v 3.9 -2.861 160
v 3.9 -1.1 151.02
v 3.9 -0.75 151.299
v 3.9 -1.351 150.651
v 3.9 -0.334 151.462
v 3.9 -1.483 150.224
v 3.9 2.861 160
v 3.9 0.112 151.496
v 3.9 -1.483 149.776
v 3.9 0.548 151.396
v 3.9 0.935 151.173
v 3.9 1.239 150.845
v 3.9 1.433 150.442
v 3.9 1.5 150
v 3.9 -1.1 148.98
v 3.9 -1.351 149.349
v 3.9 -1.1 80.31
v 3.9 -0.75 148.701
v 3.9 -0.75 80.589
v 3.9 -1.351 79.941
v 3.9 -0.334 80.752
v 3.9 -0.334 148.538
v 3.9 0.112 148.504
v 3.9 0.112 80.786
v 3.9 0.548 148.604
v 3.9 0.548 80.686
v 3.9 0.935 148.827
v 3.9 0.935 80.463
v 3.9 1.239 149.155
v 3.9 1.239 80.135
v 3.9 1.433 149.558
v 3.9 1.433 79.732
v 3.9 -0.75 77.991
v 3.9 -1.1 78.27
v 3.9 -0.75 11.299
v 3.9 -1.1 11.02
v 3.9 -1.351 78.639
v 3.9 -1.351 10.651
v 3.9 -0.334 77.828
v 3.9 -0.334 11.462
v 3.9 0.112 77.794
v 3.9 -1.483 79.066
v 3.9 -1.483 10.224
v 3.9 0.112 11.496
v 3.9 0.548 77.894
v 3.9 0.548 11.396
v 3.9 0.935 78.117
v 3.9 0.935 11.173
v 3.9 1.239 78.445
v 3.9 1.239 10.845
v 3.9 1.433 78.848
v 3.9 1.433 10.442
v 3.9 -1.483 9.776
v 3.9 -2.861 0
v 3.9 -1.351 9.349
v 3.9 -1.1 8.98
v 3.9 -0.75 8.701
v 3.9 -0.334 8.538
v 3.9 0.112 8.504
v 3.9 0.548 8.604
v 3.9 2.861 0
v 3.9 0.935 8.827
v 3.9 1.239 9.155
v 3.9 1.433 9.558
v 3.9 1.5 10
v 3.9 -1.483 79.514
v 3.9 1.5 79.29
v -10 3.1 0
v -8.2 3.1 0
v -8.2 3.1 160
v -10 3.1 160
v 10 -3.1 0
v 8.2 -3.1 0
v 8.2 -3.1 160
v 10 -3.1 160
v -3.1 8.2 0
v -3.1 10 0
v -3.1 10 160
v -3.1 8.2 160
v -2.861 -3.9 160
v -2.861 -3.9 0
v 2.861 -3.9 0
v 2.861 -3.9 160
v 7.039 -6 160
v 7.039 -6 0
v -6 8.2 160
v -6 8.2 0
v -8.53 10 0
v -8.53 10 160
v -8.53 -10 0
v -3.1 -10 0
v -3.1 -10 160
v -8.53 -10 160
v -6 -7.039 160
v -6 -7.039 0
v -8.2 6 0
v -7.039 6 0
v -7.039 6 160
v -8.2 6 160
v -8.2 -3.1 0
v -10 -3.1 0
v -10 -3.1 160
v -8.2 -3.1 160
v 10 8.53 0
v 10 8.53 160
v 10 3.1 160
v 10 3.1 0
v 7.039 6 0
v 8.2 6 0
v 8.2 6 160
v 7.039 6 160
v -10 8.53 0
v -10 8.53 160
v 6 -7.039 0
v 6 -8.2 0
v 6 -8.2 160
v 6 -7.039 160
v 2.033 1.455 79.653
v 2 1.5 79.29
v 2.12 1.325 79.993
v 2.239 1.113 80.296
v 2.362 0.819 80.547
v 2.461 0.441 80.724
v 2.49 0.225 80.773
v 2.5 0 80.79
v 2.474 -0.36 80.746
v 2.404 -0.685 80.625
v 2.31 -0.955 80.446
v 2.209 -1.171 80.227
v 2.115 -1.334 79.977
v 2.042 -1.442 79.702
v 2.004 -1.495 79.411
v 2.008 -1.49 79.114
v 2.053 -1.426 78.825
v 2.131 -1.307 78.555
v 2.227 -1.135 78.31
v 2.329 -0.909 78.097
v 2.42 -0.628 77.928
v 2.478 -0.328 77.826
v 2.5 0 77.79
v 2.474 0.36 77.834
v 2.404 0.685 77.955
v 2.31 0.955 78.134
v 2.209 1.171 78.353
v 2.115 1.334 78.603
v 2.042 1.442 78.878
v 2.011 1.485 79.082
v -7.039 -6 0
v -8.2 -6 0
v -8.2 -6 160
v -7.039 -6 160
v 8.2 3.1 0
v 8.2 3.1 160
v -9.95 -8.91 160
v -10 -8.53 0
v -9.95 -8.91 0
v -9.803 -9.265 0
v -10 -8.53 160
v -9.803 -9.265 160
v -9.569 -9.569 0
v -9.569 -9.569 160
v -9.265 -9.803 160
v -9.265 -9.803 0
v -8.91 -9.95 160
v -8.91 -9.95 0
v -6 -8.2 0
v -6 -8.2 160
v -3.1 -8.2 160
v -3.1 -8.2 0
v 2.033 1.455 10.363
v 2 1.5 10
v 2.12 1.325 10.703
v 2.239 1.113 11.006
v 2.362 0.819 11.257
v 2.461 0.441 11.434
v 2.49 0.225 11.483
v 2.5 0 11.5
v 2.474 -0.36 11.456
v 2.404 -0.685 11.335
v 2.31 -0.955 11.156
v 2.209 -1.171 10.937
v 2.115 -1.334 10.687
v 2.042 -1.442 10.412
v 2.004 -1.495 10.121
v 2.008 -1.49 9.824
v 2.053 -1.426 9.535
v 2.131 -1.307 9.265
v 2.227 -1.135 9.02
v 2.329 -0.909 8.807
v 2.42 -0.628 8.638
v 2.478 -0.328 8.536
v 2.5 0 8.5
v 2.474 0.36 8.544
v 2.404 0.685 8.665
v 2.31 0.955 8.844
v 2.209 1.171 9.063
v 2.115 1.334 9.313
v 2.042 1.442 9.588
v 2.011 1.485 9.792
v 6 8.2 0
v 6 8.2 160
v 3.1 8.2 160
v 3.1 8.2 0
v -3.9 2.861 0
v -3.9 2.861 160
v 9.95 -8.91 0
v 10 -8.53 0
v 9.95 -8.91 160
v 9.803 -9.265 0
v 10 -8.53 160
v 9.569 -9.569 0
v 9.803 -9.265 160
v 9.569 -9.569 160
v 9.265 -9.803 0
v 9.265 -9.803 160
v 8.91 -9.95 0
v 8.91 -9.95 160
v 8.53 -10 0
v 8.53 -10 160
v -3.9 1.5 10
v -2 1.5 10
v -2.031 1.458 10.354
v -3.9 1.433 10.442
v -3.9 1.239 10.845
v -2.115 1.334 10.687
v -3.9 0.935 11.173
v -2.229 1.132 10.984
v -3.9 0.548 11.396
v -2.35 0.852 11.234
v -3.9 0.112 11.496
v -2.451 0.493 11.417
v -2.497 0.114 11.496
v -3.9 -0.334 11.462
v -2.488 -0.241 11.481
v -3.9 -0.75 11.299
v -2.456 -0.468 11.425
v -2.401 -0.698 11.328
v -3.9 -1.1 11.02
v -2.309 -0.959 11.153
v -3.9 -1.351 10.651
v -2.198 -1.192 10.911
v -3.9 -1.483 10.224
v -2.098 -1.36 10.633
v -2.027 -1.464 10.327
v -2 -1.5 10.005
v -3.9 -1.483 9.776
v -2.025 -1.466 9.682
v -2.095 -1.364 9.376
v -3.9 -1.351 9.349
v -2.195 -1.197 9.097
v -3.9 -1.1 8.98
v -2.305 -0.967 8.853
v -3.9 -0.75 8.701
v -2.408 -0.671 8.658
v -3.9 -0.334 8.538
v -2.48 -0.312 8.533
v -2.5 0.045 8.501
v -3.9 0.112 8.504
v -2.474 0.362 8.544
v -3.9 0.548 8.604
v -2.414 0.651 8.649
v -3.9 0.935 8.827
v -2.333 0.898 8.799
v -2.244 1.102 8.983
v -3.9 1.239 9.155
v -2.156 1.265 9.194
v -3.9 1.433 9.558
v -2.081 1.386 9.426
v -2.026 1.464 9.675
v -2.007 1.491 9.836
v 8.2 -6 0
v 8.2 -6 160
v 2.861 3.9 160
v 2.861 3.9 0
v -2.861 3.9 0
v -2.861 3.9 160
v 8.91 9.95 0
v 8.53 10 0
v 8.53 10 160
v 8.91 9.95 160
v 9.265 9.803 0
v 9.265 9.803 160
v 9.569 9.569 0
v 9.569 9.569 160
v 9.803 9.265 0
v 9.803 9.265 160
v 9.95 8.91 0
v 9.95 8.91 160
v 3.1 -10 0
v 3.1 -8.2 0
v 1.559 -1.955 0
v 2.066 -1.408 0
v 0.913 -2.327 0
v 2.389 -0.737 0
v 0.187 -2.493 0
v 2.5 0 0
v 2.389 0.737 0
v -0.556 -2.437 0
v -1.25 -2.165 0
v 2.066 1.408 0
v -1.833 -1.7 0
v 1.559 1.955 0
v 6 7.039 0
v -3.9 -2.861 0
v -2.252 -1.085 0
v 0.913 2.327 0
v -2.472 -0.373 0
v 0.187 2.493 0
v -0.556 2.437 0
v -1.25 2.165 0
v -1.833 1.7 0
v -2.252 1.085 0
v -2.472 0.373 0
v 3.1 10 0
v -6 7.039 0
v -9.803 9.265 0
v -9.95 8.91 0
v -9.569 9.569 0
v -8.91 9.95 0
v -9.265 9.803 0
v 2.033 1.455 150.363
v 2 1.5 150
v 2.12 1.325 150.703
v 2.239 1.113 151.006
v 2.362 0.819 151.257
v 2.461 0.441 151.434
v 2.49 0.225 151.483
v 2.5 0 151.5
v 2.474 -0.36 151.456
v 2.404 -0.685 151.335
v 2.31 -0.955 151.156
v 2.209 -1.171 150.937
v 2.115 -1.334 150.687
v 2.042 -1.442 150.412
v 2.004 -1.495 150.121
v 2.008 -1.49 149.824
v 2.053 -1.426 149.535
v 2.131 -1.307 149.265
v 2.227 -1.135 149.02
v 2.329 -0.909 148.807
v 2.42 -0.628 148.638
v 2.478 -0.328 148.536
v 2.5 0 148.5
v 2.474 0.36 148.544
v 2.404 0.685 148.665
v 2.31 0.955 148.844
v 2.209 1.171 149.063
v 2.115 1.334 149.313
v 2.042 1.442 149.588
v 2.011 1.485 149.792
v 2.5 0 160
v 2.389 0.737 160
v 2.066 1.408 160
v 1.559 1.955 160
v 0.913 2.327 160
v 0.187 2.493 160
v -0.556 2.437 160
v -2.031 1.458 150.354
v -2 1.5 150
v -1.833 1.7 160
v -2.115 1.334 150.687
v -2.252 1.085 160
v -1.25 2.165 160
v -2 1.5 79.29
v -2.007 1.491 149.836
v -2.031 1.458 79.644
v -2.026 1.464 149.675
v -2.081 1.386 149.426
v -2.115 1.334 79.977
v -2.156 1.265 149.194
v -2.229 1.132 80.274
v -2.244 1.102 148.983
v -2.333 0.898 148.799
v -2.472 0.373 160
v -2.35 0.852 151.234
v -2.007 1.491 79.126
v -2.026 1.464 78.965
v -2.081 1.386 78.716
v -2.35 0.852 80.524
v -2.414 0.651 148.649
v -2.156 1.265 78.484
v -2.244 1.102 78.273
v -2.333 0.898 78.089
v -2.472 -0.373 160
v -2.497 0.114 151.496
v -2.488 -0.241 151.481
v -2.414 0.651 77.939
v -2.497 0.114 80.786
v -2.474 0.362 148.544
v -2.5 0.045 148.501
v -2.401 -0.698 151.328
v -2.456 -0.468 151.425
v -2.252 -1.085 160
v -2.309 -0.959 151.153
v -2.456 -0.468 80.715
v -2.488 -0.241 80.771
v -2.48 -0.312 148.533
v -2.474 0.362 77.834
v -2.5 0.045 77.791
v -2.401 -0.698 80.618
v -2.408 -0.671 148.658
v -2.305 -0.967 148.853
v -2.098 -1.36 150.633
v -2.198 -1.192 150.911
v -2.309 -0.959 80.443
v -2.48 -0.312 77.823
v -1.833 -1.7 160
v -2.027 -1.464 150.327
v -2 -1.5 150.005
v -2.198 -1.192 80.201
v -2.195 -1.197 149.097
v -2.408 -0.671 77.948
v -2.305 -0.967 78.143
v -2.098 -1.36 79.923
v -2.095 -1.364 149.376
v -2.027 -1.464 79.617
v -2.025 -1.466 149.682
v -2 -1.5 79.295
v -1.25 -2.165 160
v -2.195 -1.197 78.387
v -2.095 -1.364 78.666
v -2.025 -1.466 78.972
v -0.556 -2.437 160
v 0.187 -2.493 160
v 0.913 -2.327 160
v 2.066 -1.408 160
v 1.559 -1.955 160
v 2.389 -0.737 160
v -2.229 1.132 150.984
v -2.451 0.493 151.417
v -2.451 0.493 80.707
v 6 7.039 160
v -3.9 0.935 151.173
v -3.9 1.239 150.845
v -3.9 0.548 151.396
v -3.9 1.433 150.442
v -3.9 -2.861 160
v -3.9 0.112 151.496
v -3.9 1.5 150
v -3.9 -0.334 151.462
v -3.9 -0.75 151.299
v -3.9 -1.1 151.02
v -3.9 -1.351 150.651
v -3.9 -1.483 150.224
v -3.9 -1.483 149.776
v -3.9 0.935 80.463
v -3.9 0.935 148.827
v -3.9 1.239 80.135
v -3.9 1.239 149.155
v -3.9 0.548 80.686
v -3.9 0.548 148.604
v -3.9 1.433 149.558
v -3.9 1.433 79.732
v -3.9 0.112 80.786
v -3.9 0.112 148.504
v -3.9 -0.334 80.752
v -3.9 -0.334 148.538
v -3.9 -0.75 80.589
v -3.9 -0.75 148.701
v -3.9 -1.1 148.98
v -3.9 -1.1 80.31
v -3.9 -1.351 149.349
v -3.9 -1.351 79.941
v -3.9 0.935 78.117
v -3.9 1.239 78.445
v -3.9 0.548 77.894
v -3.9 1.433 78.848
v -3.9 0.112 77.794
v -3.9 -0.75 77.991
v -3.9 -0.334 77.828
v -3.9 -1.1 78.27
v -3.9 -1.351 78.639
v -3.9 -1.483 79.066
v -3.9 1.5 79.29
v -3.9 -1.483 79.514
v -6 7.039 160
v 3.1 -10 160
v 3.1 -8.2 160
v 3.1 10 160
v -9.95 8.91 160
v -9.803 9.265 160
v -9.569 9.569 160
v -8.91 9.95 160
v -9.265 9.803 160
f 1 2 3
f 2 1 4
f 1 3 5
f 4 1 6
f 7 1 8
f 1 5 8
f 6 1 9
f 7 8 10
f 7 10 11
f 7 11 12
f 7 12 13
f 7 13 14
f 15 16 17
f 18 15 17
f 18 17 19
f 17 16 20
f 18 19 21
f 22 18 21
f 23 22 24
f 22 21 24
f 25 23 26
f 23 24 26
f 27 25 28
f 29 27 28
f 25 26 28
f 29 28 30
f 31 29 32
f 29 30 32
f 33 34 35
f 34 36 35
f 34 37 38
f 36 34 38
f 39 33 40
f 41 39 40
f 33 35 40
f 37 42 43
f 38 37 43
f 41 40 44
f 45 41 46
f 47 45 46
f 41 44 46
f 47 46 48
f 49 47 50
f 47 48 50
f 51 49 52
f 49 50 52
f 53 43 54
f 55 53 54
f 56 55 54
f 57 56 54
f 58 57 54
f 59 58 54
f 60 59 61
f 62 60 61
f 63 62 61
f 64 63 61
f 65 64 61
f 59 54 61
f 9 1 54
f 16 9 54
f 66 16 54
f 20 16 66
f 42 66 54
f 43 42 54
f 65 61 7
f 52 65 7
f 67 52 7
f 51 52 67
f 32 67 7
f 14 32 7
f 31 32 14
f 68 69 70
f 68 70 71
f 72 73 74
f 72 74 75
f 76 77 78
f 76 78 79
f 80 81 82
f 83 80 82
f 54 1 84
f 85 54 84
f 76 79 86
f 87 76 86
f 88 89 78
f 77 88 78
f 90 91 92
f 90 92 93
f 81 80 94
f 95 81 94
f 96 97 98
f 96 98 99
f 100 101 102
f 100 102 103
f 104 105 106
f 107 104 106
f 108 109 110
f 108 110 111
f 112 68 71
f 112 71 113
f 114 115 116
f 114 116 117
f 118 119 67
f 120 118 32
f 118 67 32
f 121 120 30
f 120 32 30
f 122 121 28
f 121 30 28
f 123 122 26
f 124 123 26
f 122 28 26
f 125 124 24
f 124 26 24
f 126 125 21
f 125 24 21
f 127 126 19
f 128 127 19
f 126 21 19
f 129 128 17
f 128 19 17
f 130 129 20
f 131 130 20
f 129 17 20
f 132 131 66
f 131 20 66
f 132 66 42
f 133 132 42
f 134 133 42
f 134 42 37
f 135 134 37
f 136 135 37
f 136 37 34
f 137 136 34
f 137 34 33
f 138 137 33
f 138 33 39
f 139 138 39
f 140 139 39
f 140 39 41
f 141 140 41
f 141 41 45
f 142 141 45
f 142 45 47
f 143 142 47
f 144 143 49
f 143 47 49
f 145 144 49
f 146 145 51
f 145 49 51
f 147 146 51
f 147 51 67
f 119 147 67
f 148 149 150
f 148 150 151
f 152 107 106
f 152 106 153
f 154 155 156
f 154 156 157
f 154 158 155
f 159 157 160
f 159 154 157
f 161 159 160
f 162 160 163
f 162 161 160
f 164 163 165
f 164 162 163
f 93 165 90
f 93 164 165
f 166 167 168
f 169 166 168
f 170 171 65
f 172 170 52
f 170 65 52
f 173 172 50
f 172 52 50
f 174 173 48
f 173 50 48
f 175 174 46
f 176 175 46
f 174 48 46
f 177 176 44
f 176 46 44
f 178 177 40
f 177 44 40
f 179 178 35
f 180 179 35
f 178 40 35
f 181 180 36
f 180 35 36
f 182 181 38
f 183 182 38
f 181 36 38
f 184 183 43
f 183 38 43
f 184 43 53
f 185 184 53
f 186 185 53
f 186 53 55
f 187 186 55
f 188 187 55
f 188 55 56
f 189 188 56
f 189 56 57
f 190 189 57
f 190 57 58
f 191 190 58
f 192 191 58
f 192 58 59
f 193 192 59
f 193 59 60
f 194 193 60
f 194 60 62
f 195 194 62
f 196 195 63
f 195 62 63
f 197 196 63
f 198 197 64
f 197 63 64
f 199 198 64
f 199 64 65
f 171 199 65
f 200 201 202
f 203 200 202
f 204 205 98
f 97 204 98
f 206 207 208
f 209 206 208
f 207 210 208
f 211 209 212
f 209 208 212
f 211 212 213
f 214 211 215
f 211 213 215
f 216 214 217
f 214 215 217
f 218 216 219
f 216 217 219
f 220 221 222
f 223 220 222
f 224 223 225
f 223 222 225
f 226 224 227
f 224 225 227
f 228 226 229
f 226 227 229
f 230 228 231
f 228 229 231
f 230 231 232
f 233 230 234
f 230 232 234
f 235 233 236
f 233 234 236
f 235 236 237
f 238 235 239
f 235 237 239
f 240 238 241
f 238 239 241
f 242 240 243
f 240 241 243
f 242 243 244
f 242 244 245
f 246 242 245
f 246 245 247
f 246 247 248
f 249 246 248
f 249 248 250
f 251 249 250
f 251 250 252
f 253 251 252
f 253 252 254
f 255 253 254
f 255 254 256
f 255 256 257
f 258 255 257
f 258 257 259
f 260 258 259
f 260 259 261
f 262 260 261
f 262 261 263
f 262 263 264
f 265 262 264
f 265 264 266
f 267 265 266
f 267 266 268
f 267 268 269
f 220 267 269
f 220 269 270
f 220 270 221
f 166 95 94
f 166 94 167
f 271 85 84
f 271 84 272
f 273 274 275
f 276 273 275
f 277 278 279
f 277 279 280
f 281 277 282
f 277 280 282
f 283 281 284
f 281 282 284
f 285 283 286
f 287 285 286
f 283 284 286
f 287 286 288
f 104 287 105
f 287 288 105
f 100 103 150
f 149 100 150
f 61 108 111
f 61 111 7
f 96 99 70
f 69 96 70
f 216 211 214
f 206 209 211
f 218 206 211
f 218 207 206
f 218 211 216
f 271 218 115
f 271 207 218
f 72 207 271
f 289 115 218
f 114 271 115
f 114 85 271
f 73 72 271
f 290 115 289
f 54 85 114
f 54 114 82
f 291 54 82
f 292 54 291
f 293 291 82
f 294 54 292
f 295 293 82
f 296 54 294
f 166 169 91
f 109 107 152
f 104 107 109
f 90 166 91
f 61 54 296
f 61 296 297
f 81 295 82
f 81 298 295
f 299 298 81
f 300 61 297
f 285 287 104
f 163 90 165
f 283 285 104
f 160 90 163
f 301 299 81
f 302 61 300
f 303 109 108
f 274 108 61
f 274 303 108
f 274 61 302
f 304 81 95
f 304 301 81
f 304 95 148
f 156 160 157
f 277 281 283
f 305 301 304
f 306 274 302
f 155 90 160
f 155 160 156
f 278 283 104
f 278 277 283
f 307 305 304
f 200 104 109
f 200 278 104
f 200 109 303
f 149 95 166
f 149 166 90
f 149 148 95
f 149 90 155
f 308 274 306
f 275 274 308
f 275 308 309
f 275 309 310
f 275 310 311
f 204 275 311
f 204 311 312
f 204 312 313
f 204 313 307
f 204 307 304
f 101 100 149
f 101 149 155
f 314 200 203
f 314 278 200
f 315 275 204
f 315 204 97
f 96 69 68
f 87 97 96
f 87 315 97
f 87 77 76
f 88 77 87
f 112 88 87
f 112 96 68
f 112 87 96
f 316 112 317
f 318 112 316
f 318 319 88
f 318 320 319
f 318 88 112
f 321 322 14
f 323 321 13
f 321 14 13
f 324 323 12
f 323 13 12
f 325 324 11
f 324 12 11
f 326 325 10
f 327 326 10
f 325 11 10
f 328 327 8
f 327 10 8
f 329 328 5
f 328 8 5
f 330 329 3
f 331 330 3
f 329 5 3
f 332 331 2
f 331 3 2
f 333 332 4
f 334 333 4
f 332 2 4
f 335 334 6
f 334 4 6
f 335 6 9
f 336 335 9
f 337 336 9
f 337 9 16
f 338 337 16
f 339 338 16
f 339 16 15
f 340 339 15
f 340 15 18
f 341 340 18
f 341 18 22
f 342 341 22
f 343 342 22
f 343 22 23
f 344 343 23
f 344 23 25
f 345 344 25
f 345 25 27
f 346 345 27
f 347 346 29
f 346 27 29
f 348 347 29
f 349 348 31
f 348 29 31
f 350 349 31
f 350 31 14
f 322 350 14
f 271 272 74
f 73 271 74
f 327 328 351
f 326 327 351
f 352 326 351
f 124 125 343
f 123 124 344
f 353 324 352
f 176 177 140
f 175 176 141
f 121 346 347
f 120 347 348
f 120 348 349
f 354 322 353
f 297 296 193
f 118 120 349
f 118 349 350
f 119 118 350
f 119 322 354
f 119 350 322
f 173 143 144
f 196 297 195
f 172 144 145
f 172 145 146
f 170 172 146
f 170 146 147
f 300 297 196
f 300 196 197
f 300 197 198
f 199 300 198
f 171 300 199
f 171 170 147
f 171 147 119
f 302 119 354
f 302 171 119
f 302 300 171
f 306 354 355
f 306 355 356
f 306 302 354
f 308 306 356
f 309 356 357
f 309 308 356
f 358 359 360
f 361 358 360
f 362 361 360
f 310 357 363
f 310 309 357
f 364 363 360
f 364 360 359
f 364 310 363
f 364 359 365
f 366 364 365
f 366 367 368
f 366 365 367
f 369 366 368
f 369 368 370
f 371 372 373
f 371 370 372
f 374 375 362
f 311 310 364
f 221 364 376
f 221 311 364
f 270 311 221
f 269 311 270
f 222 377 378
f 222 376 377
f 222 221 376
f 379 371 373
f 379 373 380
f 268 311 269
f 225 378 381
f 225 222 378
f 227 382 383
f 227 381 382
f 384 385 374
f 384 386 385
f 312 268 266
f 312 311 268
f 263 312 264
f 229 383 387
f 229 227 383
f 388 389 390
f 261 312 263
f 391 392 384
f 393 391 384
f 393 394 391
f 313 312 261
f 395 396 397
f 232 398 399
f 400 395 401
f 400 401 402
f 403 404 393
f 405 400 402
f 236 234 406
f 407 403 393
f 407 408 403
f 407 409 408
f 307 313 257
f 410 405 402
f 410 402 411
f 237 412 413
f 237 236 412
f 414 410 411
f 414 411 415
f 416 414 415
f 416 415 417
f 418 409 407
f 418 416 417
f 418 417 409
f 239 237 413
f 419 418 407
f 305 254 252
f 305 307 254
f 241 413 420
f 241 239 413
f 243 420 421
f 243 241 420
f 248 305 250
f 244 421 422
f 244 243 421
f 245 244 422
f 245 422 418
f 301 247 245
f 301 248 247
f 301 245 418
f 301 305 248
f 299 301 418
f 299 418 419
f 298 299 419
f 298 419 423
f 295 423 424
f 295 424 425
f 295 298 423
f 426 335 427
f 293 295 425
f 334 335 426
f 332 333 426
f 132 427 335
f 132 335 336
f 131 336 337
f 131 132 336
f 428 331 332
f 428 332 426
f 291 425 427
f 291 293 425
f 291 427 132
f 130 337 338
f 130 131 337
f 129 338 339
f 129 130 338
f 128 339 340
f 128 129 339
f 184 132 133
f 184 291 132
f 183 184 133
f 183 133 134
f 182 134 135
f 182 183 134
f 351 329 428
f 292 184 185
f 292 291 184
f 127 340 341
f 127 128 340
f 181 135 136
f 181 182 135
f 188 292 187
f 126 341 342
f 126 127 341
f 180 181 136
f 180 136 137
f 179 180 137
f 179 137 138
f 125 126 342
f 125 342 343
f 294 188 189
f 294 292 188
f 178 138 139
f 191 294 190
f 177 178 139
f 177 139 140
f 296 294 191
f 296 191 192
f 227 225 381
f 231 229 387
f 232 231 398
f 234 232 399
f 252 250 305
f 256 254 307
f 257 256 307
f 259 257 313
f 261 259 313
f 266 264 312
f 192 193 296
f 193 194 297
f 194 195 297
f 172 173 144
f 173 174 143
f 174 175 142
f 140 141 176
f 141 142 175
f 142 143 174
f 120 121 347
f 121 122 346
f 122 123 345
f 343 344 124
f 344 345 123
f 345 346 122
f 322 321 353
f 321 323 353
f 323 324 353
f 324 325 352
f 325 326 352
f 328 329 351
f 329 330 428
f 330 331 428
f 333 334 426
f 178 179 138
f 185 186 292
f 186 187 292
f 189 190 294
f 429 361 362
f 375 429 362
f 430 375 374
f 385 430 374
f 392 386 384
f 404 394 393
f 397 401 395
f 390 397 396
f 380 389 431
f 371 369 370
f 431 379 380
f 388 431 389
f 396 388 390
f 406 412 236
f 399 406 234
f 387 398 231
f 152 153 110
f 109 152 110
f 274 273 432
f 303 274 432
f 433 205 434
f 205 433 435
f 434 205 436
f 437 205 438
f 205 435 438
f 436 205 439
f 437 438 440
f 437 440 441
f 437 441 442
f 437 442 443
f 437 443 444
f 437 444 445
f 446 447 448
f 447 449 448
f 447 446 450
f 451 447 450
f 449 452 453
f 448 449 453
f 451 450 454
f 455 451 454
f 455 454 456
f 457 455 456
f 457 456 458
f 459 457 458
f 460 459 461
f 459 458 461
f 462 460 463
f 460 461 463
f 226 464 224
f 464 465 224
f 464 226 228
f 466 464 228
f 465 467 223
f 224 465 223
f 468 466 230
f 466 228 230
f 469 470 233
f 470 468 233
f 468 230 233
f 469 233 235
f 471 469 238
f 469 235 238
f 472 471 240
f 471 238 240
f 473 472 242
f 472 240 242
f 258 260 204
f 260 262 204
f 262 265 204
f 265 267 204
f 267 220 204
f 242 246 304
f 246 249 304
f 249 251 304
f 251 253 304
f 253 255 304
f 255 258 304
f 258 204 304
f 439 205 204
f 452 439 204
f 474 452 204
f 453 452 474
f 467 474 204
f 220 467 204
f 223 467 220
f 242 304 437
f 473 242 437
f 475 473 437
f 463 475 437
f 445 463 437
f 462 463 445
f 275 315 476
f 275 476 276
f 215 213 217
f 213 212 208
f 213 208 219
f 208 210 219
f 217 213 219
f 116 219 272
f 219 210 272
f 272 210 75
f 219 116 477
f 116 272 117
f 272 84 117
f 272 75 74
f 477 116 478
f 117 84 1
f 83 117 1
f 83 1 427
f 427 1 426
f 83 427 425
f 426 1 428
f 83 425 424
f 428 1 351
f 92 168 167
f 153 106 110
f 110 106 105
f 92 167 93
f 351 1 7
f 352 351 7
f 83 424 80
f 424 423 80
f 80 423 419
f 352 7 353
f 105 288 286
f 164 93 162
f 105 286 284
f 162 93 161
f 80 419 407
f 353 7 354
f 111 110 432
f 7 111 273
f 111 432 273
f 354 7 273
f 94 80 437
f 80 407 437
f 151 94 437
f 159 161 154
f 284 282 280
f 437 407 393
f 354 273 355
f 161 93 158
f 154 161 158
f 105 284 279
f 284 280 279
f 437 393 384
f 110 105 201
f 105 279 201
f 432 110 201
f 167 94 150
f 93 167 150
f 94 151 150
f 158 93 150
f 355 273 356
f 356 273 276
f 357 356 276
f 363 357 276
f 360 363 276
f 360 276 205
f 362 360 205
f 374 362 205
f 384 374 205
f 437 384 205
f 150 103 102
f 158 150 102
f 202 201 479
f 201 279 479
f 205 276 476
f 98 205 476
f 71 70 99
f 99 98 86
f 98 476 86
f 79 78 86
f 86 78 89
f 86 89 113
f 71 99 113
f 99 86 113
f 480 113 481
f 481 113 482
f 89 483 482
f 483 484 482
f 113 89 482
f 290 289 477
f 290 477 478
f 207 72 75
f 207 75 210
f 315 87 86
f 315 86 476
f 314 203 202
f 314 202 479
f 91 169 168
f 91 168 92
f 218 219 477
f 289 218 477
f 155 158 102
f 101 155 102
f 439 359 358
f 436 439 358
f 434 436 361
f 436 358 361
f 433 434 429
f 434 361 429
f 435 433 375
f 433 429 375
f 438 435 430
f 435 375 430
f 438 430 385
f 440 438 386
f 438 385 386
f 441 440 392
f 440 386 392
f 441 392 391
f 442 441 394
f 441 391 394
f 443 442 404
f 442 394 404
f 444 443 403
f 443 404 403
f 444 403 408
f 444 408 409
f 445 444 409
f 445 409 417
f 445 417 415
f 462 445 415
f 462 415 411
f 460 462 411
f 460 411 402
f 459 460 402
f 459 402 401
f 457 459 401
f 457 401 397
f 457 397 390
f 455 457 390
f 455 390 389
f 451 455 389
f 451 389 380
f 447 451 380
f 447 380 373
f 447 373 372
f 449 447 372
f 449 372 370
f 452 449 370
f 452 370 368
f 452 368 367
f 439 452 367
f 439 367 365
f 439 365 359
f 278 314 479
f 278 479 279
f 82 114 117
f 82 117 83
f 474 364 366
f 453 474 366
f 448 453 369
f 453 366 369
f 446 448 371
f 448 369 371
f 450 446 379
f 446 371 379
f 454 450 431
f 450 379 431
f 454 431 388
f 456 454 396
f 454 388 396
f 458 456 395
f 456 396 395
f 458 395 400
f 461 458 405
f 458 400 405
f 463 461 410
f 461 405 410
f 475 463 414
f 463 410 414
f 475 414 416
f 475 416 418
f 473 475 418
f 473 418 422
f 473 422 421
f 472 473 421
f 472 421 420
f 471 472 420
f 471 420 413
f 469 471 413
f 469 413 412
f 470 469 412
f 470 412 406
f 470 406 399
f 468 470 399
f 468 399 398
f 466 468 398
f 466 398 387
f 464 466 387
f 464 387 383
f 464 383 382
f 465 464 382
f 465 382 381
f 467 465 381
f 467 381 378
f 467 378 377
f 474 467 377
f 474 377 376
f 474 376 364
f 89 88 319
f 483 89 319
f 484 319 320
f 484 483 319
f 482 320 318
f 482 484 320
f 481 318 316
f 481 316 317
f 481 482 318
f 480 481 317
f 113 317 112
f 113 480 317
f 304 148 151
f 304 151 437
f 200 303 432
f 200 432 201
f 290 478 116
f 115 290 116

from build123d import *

# Parameters (mm, degrees)
SKETCH1_R           = 2.5
BOSS_EXTRUDE1_DEPTH = 160
FILLET1_R           = 1.47
SKETCH2_R           = 1.5
CUT_EXTRUDE1_DEPTH  = 161.913672508


with BuildPart() as part:
    # Sketch1 → Boss-Extrude1 (new body)
    with BuildSketch(Plane.XY):
        Polygon((2.860553032, 3.9), (6, 7.039446968), (6, 8.2), (3.1, 8.2), (3.1, 10), (10, 10), (10, 3.1), (8.2, 3.1), (8.2, 6), (7.039446968, 6), (3.9, 2.860553032), (3.9, 0), (3.9, -2.860553032), (7.039446968, -6), (8.2, -6), (8.2, -3.1), (10, -3.1), (10, -10), (3.1, -10), (3.1, -8.2), (6, -8.2), (6, -7.039446968), (2.860553032, -3.9), (0, -3.9), (-2.860553032, -3.9), (-6, -7.039446968), (-6, -8.2), (-3.1, -8.2), (-3.1, -10), (-10, -10), (-10, -3.1), (-8.2, -3.1), (-8.2, -6), (-7.039446968, -6), (-3.9, -2.860553032), (-3.9, 0), (-3.9, 2.860553032), (-7.039446968, 6), (-8.2, 6), (-8.2, 3.1), (-10, 3.1), (-10, 10), (-3.1, 10), (-3.1, 8.2), (-6, 8.2), (-6, 7.039446968), (-2.860553032, 3.9), (0, 3.9), align=None)
        Circle(SKETCH1_R, mode=Mode.SUBTRACT)
    extrude(amount=BOSS_EXTRUDE1_DEPTH)

    # Fillet1
    fillet1_edges = [part.edges().sort_by_distance(p)[0] for p in [
        (10, -10, 80),
        (-10, -10, 80),
        (-10, 10, 80),
        (10, 10, 80),
    ]]
    fillet(fillet1_edges, radius=FILLET1_R)

    # Sketch2 → Cut-Extrude1 (cut, through all)
    with BuildSketch(Plane(origin=(3.9, 0, 0), x_dir=(0, 0, -1), z_dir=(1, 0, 0))):
        with Locations(Location((-150, 0, 0), (0, 0, 90))):
            Circle(SKETCH2_R)
        with Locations(Location((-79.29, 0, 0), (0, 0, 90))):
            Circle(SKETCH2_R)
        with Locations(Location((-10, 0, 0), (0, 0, 90))):
            Circle(SKETCH2_R)
    extrude(amount=-CUT_EXTRUDE1_DEPTH, mode=Mode.SUBTRACT)


solid = part.part
